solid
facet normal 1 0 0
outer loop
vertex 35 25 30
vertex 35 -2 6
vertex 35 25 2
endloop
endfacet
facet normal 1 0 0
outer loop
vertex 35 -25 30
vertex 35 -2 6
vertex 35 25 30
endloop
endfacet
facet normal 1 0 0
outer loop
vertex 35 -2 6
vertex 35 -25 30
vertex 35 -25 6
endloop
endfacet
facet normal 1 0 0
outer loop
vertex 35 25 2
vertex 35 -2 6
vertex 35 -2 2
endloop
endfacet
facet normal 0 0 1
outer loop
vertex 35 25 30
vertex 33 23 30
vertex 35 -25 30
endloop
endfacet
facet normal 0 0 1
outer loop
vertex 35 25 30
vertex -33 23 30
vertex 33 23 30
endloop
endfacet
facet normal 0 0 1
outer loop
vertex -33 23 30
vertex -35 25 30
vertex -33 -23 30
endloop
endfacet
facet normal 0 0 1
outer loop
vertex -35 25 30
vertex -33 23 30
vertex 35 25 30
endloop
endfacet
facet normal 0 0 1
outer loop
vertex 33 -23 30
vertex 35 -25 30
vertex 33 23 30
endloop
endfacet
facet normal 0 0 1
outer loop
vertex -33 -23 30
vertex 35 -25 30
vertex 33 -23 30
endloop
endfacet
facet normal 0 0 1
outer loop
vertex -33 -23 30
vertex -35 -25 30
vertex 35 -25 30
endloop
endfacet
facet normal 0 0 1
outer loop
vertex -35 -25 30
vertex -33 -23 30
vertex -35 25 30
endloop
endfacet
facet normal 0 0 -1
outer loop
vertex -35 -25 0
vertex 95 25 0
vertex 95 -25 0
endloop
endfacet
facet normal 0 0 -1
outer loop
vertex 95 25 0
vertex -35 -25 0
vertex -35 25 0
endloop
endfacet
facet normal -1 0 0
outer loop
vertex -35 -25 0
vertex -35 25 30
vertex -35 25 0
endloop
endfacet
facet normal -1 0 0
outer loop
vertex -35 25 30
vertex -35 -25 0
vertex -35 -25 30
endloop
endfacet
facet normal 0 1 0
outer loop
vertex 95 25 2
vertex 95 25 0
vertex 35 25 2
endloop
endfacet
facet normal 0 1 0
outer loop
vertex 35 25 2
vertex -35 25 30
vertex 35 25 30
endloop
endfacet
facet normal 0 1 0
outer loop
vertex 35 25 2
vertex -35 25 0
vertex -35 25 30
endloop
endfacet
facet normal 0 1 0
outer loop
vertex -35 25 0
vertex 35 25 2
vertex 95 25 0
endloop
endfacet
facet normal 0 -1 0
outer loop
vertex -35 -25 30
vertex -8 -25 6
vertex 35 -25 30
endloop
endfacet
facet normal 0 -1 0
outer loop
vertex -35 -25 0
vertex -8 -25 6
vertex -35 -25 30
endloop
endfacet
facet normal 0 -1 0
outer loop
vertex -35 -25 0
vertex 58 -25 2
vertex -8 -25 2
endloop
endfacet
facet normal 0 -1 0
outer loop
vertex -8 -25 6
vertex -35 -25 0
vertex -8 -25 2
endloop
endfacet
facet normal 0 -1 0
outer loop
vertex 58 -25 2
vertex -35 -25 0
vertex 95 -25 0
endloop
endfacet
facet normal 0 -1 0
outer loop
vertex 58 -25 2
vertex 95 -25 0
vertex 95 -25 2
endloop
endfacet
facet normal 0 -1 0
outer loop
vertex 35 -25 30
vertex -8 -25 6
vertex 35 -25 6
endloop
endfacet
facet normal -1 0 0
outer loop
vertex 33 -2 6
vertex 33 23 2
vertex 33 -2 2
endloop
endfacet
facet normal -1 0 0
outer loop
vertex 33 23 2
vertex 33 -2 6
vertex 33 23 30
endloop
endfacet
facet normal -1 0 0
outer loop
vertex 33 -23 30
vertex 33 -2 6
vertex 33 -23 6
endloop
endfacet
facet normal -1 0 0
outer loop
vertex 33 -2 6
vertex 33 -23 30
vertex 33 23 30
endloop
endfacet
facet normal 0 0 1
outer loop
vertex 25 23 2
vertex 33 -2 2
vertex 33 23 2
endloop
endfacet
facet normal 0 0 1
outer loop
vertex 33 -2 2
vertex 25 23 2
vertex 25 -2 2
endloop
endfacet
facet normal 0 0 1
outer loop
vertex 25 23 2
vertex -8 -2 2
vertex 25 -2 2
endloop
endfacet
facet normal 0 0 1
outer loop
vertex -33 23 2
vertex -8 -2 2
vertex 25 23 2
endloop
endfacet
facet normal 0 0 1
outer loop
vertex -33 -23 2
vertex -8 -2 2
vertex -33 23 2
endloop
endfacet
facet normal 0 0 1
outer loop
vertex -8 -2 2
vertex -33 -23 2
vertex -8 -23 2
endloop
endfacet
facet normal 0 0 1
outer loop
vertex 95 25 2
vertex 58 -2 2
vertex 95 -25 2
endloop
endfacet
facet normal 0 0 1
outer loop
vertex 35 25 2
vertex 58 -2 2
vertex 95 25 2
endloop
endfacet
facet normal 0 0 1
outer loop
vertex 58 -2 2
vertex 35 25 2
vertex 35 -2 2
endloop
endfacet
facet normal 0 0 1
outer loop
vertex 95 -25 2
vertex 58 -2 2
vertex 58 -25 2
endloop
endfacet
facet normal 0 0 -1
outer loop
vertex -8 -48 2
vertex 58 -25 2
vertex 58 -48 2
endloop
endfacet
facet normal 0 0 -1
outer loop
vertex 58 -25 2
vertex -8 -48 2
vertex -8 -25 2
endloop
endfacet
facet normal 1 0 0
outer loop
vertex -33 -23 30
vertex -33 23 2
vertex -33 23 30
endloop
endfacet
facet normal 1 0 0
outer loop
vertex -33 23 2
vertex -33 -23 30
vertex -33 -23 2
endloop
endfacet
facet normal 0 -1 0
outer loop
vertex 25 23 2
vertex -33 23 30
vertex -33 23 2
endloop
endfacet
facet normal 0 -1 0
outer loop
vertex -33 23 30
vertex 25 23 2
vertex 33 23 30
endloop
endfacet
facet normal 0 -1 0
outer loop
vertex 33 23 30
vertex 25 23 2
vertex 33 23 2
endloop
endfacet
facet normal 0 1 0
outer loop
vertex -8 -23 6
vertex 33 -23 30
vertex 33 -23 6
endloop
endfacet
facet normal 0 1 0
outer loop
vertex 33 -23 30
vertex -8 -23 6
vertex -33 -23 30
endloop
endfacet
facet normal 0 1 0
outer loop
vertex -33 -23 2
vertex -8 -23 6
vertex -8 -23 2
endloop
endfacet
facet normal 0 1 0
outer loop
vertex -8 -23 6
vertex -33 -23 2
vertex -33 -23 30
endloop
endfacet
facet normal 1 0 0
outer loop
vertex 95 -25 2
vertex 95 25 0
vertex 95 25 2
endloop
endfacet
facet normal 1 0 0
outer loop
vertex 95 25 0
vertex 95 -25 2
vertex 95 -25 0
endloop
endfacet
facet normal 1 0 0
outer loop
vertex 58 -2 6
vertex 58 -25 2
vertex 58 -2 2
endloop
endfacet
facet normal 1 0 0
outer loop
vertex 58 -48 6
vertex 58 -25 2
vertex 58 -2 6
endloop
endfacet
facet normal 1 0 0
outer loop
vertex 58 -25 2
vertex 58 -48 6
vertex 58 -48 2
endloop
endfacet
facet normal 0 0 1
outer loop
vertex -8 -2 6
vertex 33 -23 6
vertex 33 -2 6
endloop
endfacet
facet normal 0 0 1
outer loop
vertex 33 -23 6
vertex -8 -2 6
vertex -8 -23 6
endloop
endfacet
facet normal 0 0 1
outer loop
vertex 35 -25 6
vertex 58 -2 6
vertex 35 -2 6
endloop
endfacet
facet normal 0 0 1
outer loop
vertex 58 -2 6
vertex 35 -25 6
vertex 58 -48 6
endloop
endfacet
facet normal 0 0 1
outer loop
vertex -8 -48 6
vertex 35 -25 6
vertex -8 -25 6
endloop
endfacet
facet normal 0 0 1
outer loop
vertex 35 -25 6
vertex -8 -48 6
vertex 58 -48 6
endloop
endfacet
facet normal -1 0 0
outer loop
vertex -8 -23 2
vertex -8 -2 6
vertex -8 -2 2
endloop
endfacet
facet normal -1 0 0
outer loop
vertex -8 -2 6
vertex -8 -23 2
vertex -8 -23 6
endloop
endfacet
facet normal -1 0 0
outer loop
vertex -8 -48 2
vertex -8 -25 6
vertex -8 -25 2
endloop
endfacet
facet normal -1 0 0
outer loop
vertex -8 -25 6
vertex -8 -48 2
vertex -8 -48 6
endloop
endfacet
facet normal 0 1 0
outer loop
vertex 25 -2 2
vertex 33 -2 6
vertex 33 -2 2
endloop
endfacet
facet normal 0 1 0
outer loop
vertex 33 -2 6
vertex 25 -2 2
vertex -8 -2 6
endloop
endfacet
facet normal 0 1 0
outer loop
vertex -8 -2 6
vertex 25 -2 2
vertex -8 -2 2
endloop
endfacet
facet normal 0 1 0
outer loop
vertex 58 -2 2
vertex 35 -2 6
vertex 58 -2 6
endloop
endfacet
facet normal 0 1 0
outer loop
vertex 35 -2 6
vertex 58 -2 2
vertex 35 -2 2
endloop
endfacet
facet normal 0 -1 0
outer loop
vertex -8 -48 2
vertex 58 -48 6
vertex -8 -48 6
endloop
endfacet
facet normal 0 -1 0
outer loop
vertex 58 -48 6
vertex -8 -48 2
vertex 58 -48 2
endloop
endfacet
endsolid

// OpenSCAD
// Two-part enclosure for small electronics board (e.g. Arduino-based logger)
// Print orientation: box standing on the bed, lid on top (overhangs into box)

$fn = 64;

// ---- Box ----
box_x = 70;    // outer size in X
box_y = 50;    // outer size in Y
box_z = 30;    // outer size in Z
wall  = 2;     // wall thickness (sides and floor)

// ---- Lid ----
lip_x   = 65.6;          // outer size of lip in X
lip_y   = 45.6;          // outer size of lip in Y
lip_w   = 1.5;           // lip wall thickness
lip_h   = 4;             // lip height (slides into box opening)
clear   = 0.2;           // clearance on each side of the opening
gap     = 10;            // gap between box and lid on the bed

// ---- Derived ----
inner_x = box_x - 2*wall;   // opening width (66)
inner_y = box_y - 2*wall;   // opening depth (46)
lip_x2  = lip_x + 2*clear;  // lip outer size with clearance
lip_y2  = lip_y + 2*clear;

module box() {
    difference() {
        cube([box_x, box_y, box_z]);
        translate([wall, wall, wall])
            cube([inner_x, inner_y, box_z]);     // hollow, open top
    }
}

module lid() {
    // plate lying on the bed, with a rectangular lip on top
    union() {
        translate([0, 0, 0])
            cube([box_x, box_y, wall]);           // plate
        translate([-lip_x2/2, -lip_y2/2, wall])
            cube([lip_x2, lip_y2, lip_h]);       // lip
    }
}

translate([-box_x/2, -box_y/2, 0])
    box();

translate([box_x/2 - gap, -box_y/2, 0])
    lid();
